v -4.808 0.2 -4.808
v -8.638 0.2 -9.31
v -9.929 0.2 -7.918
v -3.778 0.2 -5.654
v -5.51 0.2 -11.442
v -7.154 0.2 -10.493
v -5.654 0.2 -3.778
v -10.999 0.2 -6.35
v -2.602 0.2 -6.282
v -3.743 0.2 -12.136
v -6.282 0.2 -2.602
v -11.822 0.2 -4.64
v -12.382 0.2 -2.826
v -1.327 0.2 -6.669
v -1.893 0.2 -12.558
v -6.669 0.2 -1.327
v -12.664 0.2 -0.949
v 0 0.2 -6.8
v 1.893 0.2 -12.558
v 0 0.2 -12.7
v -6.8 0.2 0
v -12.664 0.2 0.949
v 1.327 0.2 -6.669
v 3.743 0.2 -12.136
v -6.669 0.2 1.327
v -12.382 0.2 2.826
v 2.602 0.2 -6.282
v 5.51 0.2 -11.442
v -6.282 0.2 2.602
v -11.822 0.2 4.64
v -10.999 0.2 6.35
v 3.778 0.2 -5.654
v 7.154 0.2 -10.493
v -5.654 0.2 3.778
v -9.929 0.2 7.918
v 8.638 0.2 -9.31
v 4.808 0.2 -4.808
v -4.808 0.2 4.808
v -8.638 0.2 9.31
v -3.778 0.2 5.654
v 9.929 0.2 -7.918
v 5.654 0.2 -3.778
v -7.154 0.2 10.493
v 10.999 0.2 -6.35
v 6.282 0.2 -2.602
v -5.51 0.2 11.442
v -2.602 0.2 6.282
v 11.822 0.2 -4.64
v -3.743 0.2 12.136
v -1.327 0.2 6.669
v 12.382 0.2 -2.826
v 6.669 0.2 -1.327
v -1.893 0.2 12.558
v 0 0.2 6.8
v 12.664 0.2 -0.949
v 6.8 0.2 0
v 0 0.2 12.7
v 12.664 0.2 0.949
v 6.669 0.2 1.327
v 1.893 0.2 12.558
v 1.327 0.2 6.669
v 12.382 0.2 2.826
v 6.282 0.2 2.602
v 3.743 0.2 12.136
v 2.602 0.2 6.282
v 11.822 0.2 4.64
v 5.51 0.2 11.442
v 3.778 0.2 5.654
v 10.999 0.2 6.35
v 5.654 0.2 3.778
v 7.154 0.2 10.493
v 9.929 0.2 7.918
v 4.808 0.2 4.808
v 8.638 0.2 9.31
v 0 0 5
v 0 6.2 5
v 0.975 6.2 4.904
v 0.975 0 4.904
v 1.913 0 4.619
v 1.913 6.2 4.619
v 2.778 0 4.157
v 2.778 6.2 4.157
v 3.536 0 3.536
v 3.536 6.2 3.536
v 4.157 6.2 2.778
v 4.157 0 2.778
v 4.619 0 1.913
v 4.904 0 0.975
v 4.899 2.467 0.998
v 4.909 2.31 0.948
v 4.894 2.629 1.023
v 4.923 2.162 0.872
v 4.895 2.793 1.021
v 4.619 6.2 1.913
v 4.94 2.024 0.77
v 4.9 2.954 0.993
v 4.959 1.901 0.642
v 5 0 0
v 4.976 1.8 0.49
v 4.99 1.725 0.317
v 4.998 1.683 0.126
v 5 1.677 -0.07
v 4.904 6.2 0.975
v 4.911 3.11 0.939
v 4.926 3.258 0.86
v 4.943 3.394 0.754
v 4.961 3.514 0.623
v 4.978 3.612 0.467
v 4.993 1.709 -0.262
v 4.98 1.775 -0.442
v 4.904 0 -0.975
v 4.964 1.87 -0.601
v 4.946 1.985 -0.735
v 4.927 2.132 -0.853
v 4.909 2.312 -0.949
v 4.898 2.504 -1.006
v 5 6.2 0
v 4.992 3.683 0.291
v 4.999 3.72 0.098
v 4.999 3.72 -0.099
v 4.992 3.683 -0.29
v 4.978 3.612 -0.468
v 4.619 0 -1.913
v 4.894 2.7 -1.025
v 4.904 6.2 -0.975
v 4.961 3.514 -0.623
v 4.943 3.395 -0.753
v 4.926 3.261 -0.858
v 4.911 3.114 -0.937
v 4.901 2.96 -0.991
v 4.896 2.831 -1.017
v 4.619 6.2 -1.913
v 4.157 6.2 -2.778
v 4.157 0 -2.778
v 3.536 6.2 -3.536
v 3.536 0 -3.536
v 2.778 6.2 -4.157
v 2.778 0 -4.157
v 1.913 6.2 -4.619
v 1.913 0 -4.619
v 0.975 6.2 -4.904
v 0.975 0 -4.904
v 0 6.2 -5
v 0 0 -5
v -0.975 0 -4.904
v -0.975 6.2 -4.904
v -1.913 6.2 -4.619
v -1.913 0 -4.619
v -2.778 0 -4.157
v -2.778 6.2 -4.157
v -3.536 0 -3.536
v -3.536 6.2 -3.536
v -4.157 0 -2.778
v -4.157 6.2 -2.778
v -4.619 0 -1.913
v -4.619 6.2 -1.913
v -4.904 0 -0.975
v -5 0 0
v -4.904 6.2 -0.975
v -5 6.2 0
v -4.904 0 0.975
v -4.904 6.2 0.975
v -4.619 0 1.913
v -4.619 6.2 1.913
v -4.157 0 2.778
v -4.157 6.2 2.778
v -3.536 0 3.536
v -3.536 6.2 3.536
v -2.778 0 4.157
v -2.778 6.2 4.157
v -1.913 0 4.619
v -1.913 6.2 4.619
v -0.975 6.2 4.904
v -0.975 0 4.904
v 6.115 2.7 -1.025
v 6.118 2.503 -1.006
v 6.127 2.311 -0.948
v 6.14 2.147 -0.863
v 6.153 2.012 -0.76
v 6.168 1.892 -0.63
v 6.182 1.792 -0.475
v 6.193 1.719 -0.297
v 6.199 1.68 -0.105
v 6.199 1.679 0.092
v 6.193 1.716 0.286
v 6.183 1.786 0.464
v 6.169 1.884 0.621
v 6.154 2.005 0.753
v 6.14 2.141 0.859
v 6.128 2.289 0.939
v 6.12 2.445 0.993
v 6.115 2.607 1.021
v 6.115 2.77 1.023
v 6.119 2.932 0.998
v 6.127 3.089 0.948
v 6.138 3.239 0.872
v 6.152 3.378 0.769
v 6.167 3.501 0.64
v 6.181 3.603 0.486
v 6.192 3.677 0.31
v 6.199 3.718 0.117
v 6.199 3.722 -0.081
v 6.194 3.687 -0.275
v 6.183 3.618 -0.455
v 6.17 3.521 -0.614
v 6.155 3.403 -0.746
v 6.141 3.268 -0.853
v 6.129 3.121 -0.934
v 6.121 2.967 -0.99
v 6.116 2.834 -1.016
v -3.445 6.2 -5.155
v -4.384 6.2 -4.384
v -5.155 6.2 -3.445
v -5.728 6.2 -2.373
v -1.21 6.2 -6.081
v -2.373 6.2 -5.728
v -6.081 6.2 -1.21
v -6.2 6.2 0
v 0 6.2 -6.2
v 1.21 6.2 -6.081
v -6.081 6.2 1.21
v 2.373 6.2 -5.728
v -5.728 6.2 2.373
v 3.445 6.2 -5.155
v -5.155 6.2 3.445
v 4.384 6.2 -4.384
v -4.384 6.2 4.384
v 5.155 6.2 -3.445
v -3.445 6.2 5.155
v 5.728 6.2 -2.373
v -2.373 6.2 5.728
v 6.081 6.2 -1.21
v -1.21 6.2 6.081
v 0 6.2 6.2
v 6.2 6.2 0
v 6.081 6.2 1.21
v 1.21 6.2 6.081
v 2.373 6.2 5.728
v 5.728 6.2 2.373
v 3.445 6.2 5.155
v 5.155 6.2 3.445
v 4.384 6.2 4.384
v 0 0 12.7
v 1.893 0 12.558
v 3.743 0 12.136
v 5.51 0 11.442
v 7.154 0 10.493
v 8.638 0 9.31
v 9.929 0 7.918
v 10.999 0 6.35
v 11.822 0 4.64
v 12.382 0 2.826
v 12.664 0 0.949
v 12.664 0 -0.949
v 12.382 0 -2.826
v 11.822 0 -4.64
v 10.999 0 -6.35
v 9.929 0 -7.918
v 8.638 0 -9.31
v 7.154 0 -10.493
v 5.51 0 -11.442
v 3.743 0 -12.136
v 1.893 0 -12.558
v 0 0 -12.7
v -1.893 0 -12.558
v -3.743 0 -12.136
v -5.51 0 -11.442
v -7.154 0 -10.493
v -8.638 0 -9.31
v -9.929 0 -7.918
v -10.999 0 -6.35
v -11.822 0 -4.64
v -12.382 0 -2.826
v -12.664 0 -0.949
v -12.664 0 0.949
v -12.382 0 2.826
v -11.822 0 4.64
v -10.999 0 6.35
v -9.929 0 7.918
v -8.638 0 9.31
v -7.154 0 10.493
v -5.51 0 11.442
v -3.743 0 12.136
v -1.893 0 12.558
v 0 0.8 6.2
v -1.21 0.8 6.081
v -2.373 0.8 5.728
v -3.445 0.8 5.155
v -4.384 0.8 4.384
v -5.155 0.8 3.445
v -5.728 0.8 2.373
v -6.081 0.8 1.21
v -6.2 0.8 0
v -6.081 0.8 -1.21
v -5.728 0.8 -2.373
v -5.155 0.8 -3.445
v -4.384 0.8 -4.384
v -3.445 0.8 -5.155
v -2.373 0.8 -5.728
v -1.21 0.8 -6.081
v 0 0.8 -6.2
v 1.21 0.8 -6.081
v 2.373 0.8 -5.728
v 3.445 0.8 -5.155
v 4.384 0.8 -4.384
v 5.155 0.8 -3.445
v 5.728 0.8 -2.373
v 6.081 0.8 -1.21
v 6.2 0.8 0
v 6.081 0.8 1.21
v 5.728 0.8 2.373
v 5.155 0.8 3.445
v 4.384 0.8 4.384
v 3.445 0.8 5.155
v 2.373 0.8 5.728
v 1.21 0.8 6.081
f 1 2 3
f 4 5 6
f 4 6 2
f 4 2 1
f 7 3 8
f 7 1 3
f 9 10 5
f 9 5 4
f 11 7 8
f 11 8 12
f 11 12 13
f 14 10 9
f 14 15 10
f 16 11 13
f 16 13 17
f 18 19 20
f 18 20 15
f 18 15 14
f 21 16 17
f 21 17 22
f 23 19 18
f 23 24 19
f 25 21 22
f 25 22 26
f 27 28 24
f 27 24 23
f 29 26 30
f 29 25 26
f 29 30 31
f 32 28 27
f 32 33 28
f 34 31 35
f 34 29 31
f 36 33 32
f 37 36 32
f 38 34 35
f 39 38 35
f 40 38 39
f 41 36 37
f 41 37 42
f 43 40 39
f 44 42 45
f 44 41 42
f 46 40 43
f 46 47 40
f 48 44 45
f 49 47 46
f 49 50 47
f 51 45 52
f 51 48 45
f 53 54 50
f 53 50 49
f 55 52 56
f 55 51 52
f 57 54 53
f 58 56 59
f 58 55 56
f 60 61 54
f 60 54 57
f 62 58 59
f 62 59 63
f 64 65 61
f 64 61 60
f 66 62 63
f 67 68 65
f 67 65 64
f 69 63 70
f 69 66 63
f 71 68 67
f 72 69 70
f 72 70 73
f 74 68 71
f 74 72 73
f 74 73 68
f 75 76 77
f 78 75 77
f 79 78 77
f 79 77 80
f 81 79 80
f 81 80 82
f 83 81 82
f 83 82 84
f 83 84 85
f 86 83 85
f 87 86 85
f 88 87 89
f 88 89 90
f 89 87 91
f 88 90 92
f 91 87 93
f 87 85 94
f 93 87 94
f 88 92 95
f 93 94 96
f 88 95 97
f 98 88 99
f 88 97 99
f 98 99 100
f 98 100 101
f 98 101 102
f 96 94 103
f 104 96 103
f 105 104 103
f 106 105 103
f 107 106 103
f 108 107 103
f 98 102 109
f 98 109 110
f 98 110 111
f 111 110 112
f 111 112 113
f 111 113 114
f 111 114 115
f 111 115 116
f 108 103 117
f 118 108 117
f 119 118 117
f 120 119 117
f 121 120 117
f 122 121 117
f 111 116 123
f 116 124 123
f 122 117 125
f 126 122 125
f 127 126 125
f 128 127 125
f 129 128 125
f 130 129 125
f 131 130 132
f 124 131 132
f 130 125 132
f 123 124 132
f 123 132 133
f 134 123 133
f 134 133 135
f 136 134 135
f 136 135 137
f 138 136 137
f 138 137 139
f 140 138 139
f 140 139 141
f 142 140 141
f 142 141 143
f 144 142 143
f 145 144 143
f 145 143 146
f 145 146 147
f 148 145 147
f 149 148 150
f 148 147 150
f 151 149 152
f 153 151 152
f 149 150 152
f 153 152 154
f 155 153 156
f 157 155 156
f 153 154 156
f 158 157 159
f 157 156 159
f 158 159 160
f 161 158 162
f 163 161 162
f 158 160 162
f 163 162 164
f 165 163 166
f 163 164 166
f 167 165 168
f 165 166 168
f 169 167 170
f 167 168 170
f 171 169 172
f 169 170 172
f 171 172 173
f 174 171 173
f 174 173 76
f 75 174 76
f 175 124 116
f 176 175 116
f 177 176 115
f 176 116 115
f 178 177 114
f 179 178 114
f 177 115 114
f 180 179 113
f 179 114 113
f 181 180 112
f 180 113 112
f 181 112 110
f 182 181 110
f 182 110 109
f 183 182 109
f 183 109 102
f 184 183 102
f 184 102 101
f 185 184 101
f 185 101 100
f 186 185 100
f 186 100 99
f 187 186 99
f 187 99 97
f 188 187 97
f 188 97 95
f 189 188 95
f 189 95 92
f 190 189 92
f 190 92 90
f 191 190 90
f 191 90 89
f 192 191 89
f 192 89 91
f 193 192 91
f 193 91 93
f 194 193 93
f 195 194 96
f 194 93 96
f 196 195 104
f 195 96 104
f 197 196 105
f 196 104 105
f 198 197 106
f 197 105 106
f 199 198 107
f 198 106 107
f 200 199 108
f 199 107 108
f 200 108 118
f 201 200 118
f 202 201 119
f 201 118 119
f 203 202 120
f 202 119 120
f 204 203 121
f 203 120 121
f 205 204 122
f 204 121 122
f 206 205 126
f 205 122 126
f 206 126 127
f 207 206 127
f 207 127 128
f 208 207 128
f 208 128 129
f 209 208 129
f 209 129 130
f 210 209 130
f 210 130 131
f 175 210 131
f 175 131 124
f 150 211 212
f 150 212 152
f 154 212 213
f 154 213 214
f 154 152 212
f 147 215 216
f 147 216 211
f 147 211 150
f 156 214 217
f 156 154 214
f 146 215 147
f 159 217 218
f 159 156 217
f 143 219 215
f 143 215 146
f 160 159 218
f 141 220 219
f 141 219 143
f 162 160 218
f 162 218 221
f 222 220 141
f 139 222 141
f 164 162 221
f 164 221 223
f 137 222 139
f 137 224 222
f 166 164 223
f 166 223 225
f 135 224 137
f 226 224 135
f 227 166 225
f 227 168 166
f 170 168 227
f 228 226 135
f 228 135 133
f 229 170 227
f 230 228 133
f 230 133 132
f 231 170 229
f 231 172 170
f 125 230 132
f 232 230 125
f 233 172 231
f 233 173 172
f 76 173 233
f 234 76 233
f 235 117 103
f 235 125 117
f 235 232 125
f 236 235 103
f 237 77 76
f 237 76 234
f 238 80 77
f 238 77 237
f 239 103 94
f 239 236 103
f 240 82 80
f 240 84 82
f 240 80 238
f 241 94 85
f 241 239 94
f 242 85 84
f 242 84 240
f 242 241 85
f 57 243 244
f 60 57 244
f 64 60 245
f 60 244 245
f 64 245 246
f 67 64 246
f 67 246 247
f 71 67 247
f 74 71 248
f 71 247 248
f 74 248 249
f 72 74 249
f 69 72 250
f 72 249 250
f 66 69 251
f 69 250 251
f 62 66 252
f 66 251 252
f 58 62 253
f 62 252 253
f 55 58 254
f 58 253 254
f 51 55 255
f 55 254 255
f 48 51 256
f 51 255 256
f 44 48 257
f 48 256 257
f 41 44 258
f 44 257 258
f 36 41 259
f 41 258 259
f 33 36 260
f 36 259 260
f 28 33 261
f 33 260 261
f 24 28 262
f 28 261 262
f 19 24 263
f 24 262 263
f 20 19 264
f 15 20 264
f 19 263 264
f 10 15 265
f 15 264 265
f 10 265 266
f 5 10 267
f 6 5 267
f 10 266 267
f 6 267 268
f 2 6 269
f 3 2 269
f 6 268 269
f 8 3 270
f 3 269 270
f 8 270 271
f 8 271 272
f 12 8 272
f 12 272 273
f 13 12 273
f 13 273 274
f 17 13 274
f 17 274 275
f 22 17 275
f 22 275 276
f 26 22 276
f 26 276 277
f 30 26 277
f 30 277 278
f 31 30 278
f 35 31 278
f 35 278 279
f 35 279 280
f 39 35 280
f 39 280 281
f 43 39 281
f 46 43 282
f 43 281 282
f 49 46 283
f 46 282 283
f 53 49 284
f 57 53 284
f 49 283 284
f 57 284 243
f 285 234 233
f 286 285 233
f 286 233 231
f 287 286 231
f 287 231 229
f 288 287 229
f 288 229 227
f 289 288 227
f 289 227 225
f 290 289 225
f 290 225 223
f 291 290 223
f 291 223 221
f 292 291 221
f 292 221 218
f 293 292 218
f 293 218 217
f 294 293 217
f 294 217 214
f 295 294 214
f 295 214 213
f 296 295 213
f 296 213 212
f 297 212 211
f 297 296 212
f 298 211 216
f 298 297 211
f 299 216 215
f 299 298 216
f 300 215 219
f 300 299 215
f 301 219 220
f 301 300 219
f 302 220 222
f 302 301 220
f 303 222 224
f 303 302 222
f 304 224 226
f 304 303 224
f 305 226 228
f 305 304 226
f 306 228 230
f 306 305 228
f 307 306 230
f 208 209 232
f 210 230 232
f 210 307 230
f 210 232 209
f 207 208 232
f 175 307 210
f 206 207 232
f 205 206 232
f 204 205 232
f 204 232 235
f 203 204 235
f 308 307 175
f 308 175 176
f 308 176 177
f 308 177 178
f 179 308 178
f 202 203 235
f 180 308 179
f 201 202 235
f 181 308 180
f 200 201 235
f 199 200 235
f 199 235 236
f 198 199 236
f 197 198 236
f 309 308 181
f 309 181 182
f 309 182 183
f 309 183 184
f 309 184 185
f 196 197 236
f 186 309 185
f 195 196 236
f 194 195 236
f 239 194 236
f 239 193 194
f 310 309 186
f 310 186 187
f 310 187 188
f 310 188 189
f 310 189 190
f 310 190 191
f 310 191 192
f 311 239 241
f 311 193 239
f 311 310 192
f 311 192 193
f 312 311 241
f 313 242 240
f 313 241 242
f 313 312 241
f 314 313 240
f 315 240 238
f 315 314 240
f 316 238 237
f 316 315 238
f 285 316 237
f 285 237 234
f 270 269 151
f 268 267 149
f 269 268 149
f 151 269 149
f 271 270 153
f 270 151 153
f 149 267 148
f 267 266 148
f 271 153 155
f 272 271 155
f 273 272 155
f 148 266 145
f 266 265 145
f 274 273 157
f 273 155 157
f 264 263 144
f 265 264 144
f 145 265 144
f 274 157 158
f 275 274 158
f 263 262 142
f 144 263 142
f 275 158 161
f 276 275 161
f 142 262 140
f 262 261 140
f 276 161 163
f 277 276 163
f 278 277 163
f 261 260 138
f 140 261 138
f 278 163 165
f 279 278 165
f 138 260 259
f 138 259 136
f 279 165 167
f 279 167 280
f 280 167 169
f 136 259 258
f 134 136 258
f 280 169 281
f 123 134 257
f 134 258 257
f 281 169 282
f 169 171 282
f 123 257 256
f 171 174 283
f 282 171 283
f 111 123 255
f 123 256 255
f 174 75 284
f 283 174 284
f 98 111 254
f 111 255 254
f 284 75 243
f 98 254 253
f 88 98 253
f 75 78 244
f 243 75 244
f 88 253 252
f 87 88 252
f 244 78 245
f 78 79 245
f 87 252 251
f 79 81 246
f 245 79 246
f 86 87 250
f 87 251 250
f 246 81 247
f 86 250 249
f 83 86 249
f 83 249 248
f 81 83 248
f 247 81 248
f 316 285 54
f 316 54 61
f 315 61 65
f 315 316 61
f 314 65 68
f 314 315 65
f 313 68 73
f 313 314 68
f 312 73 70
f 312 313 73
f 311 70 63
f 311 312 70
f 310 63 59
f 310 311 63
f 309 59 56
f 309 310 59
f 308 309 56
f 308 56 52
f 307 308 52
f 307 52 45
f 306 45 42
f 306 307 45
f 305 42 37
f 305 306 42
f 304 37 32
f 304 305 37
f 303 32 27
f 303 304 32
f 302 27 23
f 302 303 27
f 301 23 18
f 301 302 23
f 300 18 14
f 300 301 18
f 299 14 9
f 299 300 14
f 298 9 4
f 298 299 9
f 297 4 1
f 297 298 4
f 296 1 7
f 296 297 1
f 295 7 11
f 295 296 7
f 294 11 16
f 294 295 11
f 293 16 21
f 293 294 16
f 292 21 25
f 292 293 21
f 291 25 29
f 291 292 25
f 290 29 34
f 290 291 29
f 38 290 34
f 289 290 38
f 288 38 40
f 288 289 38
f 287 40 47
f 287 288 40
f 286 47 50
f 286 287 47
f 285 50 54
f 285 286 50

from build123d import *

# Parameters (mm, degrees)
SKETCH1_R               = 12.7
BOSS_EXTRUDE1_DEPTH     = 0.2
SKETCH2_R               = 7
BOSS_EXTRUDE2_DEPTH     = 0.8
SKETCH3_R               = 6.2
BOSS_EXTRUDE3_DEPTH     = 5.2
CHAMFER1_SIZE           = 1
SKETCH5_R               = 5
CUT_EXTRUDE1_DEPTH      = 20.000526308
M2_5_TAPPED_HOLE1_D     = 2.05
M2_5_TAPPED_HOLE1_DEPTH = 6.199
M2_5_TAPPED_HOLE1_TIP   = 0.615882135


with BuildPart() as part:
    # Sketch1 → Boss-Extrude1 (new body)
    with BuildSketch(Plane(origin=(0, 0, 0), x_dir=(1, 0, 0), z_dir=(0, 1, 0))):
        with Locations(Location((0, 0, 0), (0, 0, 270))):
            Circle(SKETCH1_R)
    extrude(amount=BOSS_EXTRUDE1_DEPTH)

    # Sketch2 → Boss-Extrude2 (add)
    with BuildSketch(Plane(origin=(0, 0.2, 0), x_dir=(1, 0, 0), z_dir=(0, 1, 0))):
        with Locations(Location((0, 0, 0), (0, 0, 270))):
            Circle(SKETCH2_R)
    extrude(amount=BOSS_EXTRUDE2_DEPTH)

    # Sketch3 → Boss-Extrude3 (add)
    with BuildSketch(Plane(origin=(0, 1, 0), x_dir=(1, 0, 0), z_dir=(0, 1, 0))):
        with Locations(Location((0, 0, 0), (0, 0, 270))):
            Circle(SKETCH3_R)
    extrude(amount=BOSS_EXTRUDE3_DEPTH)

    # Chamfer1
    # the kernel refuses this chamfer: 1 mm, written as the material it takes off along each edge
    with BuildSketch(Plane(origin=(0, 1, 0), x_dir=(0, 0, 1), z_dir=(-1, 0, 0))) as chamfer1_piece_1_section:
        Polygon((7, -CHAMFER1_SIZE), (7 - CHAMFER1_SIZE, 0), (7, 0), align=None)
    chamfer1_piece_1 = revolve(axis=Axis((0, 1, 0), (0, 1, 0)), mode=Mode.PRIVATE)
    chamfer1_piece_1 = split(chamfer1_piece_1, bisect_by=Plane(origin=(0, 0.2, -6.519416157), z_dir=(0, 1, 0)), keep=Keep.TOP, mode=Mode.PRIVATE)
    chamfer1_piece_1 = chamfer1_piece_1 - Plane(origin=(0, 0.519416157, 0), x_dir=(0, 0, 1), z_dir=(0, -1, 0)) * Cylinder(6.2, 28, mode=Mode.PRIVATE)
    add(chamfer1_piece_1, mode=Mode.SUBTRACT)

    # Sketch5 → Cut-Extrude1 (cut, through all)
    with BuildSketch(Plane(origin=(0, 6.2, 0), x_dir=(1, 0, 0), z_dir=(0, 1, 0))):
        with Locations(Location((0, 0, 0), (0, 0, 270))):
            Circle(SKETCH5_R)
    extrude(amount=-CUT_EXTRUDE1_DEPTH, mode=Mode.SUBTRACT)

    # M2.5 Tapped Hole1
    with Locations(Plane(origin=(6.2, 2.7, 0), x_dir=(0, 0, 1), z_dir=(1, 0, 0))):
        with Locations((0, 0)):
            Hole(M2_5_TAPPED_HOLE1_D / 2, depth=M2_5_TAPPED_HOLE1_DEPTH)
            with Locations((0, 0, -(M2_5_TAPPED_HOLE1_DEPTH + M2_5_TAPPED_HOLE1_TIP / 2))):  # 118° drill point
                Cone(0, M2_5_TAPPED_HOLE1_D / 2, M2_5_TAPPED_HOLE1_TIP, mode=Mode.SUBTRACT)


solid = part.part
